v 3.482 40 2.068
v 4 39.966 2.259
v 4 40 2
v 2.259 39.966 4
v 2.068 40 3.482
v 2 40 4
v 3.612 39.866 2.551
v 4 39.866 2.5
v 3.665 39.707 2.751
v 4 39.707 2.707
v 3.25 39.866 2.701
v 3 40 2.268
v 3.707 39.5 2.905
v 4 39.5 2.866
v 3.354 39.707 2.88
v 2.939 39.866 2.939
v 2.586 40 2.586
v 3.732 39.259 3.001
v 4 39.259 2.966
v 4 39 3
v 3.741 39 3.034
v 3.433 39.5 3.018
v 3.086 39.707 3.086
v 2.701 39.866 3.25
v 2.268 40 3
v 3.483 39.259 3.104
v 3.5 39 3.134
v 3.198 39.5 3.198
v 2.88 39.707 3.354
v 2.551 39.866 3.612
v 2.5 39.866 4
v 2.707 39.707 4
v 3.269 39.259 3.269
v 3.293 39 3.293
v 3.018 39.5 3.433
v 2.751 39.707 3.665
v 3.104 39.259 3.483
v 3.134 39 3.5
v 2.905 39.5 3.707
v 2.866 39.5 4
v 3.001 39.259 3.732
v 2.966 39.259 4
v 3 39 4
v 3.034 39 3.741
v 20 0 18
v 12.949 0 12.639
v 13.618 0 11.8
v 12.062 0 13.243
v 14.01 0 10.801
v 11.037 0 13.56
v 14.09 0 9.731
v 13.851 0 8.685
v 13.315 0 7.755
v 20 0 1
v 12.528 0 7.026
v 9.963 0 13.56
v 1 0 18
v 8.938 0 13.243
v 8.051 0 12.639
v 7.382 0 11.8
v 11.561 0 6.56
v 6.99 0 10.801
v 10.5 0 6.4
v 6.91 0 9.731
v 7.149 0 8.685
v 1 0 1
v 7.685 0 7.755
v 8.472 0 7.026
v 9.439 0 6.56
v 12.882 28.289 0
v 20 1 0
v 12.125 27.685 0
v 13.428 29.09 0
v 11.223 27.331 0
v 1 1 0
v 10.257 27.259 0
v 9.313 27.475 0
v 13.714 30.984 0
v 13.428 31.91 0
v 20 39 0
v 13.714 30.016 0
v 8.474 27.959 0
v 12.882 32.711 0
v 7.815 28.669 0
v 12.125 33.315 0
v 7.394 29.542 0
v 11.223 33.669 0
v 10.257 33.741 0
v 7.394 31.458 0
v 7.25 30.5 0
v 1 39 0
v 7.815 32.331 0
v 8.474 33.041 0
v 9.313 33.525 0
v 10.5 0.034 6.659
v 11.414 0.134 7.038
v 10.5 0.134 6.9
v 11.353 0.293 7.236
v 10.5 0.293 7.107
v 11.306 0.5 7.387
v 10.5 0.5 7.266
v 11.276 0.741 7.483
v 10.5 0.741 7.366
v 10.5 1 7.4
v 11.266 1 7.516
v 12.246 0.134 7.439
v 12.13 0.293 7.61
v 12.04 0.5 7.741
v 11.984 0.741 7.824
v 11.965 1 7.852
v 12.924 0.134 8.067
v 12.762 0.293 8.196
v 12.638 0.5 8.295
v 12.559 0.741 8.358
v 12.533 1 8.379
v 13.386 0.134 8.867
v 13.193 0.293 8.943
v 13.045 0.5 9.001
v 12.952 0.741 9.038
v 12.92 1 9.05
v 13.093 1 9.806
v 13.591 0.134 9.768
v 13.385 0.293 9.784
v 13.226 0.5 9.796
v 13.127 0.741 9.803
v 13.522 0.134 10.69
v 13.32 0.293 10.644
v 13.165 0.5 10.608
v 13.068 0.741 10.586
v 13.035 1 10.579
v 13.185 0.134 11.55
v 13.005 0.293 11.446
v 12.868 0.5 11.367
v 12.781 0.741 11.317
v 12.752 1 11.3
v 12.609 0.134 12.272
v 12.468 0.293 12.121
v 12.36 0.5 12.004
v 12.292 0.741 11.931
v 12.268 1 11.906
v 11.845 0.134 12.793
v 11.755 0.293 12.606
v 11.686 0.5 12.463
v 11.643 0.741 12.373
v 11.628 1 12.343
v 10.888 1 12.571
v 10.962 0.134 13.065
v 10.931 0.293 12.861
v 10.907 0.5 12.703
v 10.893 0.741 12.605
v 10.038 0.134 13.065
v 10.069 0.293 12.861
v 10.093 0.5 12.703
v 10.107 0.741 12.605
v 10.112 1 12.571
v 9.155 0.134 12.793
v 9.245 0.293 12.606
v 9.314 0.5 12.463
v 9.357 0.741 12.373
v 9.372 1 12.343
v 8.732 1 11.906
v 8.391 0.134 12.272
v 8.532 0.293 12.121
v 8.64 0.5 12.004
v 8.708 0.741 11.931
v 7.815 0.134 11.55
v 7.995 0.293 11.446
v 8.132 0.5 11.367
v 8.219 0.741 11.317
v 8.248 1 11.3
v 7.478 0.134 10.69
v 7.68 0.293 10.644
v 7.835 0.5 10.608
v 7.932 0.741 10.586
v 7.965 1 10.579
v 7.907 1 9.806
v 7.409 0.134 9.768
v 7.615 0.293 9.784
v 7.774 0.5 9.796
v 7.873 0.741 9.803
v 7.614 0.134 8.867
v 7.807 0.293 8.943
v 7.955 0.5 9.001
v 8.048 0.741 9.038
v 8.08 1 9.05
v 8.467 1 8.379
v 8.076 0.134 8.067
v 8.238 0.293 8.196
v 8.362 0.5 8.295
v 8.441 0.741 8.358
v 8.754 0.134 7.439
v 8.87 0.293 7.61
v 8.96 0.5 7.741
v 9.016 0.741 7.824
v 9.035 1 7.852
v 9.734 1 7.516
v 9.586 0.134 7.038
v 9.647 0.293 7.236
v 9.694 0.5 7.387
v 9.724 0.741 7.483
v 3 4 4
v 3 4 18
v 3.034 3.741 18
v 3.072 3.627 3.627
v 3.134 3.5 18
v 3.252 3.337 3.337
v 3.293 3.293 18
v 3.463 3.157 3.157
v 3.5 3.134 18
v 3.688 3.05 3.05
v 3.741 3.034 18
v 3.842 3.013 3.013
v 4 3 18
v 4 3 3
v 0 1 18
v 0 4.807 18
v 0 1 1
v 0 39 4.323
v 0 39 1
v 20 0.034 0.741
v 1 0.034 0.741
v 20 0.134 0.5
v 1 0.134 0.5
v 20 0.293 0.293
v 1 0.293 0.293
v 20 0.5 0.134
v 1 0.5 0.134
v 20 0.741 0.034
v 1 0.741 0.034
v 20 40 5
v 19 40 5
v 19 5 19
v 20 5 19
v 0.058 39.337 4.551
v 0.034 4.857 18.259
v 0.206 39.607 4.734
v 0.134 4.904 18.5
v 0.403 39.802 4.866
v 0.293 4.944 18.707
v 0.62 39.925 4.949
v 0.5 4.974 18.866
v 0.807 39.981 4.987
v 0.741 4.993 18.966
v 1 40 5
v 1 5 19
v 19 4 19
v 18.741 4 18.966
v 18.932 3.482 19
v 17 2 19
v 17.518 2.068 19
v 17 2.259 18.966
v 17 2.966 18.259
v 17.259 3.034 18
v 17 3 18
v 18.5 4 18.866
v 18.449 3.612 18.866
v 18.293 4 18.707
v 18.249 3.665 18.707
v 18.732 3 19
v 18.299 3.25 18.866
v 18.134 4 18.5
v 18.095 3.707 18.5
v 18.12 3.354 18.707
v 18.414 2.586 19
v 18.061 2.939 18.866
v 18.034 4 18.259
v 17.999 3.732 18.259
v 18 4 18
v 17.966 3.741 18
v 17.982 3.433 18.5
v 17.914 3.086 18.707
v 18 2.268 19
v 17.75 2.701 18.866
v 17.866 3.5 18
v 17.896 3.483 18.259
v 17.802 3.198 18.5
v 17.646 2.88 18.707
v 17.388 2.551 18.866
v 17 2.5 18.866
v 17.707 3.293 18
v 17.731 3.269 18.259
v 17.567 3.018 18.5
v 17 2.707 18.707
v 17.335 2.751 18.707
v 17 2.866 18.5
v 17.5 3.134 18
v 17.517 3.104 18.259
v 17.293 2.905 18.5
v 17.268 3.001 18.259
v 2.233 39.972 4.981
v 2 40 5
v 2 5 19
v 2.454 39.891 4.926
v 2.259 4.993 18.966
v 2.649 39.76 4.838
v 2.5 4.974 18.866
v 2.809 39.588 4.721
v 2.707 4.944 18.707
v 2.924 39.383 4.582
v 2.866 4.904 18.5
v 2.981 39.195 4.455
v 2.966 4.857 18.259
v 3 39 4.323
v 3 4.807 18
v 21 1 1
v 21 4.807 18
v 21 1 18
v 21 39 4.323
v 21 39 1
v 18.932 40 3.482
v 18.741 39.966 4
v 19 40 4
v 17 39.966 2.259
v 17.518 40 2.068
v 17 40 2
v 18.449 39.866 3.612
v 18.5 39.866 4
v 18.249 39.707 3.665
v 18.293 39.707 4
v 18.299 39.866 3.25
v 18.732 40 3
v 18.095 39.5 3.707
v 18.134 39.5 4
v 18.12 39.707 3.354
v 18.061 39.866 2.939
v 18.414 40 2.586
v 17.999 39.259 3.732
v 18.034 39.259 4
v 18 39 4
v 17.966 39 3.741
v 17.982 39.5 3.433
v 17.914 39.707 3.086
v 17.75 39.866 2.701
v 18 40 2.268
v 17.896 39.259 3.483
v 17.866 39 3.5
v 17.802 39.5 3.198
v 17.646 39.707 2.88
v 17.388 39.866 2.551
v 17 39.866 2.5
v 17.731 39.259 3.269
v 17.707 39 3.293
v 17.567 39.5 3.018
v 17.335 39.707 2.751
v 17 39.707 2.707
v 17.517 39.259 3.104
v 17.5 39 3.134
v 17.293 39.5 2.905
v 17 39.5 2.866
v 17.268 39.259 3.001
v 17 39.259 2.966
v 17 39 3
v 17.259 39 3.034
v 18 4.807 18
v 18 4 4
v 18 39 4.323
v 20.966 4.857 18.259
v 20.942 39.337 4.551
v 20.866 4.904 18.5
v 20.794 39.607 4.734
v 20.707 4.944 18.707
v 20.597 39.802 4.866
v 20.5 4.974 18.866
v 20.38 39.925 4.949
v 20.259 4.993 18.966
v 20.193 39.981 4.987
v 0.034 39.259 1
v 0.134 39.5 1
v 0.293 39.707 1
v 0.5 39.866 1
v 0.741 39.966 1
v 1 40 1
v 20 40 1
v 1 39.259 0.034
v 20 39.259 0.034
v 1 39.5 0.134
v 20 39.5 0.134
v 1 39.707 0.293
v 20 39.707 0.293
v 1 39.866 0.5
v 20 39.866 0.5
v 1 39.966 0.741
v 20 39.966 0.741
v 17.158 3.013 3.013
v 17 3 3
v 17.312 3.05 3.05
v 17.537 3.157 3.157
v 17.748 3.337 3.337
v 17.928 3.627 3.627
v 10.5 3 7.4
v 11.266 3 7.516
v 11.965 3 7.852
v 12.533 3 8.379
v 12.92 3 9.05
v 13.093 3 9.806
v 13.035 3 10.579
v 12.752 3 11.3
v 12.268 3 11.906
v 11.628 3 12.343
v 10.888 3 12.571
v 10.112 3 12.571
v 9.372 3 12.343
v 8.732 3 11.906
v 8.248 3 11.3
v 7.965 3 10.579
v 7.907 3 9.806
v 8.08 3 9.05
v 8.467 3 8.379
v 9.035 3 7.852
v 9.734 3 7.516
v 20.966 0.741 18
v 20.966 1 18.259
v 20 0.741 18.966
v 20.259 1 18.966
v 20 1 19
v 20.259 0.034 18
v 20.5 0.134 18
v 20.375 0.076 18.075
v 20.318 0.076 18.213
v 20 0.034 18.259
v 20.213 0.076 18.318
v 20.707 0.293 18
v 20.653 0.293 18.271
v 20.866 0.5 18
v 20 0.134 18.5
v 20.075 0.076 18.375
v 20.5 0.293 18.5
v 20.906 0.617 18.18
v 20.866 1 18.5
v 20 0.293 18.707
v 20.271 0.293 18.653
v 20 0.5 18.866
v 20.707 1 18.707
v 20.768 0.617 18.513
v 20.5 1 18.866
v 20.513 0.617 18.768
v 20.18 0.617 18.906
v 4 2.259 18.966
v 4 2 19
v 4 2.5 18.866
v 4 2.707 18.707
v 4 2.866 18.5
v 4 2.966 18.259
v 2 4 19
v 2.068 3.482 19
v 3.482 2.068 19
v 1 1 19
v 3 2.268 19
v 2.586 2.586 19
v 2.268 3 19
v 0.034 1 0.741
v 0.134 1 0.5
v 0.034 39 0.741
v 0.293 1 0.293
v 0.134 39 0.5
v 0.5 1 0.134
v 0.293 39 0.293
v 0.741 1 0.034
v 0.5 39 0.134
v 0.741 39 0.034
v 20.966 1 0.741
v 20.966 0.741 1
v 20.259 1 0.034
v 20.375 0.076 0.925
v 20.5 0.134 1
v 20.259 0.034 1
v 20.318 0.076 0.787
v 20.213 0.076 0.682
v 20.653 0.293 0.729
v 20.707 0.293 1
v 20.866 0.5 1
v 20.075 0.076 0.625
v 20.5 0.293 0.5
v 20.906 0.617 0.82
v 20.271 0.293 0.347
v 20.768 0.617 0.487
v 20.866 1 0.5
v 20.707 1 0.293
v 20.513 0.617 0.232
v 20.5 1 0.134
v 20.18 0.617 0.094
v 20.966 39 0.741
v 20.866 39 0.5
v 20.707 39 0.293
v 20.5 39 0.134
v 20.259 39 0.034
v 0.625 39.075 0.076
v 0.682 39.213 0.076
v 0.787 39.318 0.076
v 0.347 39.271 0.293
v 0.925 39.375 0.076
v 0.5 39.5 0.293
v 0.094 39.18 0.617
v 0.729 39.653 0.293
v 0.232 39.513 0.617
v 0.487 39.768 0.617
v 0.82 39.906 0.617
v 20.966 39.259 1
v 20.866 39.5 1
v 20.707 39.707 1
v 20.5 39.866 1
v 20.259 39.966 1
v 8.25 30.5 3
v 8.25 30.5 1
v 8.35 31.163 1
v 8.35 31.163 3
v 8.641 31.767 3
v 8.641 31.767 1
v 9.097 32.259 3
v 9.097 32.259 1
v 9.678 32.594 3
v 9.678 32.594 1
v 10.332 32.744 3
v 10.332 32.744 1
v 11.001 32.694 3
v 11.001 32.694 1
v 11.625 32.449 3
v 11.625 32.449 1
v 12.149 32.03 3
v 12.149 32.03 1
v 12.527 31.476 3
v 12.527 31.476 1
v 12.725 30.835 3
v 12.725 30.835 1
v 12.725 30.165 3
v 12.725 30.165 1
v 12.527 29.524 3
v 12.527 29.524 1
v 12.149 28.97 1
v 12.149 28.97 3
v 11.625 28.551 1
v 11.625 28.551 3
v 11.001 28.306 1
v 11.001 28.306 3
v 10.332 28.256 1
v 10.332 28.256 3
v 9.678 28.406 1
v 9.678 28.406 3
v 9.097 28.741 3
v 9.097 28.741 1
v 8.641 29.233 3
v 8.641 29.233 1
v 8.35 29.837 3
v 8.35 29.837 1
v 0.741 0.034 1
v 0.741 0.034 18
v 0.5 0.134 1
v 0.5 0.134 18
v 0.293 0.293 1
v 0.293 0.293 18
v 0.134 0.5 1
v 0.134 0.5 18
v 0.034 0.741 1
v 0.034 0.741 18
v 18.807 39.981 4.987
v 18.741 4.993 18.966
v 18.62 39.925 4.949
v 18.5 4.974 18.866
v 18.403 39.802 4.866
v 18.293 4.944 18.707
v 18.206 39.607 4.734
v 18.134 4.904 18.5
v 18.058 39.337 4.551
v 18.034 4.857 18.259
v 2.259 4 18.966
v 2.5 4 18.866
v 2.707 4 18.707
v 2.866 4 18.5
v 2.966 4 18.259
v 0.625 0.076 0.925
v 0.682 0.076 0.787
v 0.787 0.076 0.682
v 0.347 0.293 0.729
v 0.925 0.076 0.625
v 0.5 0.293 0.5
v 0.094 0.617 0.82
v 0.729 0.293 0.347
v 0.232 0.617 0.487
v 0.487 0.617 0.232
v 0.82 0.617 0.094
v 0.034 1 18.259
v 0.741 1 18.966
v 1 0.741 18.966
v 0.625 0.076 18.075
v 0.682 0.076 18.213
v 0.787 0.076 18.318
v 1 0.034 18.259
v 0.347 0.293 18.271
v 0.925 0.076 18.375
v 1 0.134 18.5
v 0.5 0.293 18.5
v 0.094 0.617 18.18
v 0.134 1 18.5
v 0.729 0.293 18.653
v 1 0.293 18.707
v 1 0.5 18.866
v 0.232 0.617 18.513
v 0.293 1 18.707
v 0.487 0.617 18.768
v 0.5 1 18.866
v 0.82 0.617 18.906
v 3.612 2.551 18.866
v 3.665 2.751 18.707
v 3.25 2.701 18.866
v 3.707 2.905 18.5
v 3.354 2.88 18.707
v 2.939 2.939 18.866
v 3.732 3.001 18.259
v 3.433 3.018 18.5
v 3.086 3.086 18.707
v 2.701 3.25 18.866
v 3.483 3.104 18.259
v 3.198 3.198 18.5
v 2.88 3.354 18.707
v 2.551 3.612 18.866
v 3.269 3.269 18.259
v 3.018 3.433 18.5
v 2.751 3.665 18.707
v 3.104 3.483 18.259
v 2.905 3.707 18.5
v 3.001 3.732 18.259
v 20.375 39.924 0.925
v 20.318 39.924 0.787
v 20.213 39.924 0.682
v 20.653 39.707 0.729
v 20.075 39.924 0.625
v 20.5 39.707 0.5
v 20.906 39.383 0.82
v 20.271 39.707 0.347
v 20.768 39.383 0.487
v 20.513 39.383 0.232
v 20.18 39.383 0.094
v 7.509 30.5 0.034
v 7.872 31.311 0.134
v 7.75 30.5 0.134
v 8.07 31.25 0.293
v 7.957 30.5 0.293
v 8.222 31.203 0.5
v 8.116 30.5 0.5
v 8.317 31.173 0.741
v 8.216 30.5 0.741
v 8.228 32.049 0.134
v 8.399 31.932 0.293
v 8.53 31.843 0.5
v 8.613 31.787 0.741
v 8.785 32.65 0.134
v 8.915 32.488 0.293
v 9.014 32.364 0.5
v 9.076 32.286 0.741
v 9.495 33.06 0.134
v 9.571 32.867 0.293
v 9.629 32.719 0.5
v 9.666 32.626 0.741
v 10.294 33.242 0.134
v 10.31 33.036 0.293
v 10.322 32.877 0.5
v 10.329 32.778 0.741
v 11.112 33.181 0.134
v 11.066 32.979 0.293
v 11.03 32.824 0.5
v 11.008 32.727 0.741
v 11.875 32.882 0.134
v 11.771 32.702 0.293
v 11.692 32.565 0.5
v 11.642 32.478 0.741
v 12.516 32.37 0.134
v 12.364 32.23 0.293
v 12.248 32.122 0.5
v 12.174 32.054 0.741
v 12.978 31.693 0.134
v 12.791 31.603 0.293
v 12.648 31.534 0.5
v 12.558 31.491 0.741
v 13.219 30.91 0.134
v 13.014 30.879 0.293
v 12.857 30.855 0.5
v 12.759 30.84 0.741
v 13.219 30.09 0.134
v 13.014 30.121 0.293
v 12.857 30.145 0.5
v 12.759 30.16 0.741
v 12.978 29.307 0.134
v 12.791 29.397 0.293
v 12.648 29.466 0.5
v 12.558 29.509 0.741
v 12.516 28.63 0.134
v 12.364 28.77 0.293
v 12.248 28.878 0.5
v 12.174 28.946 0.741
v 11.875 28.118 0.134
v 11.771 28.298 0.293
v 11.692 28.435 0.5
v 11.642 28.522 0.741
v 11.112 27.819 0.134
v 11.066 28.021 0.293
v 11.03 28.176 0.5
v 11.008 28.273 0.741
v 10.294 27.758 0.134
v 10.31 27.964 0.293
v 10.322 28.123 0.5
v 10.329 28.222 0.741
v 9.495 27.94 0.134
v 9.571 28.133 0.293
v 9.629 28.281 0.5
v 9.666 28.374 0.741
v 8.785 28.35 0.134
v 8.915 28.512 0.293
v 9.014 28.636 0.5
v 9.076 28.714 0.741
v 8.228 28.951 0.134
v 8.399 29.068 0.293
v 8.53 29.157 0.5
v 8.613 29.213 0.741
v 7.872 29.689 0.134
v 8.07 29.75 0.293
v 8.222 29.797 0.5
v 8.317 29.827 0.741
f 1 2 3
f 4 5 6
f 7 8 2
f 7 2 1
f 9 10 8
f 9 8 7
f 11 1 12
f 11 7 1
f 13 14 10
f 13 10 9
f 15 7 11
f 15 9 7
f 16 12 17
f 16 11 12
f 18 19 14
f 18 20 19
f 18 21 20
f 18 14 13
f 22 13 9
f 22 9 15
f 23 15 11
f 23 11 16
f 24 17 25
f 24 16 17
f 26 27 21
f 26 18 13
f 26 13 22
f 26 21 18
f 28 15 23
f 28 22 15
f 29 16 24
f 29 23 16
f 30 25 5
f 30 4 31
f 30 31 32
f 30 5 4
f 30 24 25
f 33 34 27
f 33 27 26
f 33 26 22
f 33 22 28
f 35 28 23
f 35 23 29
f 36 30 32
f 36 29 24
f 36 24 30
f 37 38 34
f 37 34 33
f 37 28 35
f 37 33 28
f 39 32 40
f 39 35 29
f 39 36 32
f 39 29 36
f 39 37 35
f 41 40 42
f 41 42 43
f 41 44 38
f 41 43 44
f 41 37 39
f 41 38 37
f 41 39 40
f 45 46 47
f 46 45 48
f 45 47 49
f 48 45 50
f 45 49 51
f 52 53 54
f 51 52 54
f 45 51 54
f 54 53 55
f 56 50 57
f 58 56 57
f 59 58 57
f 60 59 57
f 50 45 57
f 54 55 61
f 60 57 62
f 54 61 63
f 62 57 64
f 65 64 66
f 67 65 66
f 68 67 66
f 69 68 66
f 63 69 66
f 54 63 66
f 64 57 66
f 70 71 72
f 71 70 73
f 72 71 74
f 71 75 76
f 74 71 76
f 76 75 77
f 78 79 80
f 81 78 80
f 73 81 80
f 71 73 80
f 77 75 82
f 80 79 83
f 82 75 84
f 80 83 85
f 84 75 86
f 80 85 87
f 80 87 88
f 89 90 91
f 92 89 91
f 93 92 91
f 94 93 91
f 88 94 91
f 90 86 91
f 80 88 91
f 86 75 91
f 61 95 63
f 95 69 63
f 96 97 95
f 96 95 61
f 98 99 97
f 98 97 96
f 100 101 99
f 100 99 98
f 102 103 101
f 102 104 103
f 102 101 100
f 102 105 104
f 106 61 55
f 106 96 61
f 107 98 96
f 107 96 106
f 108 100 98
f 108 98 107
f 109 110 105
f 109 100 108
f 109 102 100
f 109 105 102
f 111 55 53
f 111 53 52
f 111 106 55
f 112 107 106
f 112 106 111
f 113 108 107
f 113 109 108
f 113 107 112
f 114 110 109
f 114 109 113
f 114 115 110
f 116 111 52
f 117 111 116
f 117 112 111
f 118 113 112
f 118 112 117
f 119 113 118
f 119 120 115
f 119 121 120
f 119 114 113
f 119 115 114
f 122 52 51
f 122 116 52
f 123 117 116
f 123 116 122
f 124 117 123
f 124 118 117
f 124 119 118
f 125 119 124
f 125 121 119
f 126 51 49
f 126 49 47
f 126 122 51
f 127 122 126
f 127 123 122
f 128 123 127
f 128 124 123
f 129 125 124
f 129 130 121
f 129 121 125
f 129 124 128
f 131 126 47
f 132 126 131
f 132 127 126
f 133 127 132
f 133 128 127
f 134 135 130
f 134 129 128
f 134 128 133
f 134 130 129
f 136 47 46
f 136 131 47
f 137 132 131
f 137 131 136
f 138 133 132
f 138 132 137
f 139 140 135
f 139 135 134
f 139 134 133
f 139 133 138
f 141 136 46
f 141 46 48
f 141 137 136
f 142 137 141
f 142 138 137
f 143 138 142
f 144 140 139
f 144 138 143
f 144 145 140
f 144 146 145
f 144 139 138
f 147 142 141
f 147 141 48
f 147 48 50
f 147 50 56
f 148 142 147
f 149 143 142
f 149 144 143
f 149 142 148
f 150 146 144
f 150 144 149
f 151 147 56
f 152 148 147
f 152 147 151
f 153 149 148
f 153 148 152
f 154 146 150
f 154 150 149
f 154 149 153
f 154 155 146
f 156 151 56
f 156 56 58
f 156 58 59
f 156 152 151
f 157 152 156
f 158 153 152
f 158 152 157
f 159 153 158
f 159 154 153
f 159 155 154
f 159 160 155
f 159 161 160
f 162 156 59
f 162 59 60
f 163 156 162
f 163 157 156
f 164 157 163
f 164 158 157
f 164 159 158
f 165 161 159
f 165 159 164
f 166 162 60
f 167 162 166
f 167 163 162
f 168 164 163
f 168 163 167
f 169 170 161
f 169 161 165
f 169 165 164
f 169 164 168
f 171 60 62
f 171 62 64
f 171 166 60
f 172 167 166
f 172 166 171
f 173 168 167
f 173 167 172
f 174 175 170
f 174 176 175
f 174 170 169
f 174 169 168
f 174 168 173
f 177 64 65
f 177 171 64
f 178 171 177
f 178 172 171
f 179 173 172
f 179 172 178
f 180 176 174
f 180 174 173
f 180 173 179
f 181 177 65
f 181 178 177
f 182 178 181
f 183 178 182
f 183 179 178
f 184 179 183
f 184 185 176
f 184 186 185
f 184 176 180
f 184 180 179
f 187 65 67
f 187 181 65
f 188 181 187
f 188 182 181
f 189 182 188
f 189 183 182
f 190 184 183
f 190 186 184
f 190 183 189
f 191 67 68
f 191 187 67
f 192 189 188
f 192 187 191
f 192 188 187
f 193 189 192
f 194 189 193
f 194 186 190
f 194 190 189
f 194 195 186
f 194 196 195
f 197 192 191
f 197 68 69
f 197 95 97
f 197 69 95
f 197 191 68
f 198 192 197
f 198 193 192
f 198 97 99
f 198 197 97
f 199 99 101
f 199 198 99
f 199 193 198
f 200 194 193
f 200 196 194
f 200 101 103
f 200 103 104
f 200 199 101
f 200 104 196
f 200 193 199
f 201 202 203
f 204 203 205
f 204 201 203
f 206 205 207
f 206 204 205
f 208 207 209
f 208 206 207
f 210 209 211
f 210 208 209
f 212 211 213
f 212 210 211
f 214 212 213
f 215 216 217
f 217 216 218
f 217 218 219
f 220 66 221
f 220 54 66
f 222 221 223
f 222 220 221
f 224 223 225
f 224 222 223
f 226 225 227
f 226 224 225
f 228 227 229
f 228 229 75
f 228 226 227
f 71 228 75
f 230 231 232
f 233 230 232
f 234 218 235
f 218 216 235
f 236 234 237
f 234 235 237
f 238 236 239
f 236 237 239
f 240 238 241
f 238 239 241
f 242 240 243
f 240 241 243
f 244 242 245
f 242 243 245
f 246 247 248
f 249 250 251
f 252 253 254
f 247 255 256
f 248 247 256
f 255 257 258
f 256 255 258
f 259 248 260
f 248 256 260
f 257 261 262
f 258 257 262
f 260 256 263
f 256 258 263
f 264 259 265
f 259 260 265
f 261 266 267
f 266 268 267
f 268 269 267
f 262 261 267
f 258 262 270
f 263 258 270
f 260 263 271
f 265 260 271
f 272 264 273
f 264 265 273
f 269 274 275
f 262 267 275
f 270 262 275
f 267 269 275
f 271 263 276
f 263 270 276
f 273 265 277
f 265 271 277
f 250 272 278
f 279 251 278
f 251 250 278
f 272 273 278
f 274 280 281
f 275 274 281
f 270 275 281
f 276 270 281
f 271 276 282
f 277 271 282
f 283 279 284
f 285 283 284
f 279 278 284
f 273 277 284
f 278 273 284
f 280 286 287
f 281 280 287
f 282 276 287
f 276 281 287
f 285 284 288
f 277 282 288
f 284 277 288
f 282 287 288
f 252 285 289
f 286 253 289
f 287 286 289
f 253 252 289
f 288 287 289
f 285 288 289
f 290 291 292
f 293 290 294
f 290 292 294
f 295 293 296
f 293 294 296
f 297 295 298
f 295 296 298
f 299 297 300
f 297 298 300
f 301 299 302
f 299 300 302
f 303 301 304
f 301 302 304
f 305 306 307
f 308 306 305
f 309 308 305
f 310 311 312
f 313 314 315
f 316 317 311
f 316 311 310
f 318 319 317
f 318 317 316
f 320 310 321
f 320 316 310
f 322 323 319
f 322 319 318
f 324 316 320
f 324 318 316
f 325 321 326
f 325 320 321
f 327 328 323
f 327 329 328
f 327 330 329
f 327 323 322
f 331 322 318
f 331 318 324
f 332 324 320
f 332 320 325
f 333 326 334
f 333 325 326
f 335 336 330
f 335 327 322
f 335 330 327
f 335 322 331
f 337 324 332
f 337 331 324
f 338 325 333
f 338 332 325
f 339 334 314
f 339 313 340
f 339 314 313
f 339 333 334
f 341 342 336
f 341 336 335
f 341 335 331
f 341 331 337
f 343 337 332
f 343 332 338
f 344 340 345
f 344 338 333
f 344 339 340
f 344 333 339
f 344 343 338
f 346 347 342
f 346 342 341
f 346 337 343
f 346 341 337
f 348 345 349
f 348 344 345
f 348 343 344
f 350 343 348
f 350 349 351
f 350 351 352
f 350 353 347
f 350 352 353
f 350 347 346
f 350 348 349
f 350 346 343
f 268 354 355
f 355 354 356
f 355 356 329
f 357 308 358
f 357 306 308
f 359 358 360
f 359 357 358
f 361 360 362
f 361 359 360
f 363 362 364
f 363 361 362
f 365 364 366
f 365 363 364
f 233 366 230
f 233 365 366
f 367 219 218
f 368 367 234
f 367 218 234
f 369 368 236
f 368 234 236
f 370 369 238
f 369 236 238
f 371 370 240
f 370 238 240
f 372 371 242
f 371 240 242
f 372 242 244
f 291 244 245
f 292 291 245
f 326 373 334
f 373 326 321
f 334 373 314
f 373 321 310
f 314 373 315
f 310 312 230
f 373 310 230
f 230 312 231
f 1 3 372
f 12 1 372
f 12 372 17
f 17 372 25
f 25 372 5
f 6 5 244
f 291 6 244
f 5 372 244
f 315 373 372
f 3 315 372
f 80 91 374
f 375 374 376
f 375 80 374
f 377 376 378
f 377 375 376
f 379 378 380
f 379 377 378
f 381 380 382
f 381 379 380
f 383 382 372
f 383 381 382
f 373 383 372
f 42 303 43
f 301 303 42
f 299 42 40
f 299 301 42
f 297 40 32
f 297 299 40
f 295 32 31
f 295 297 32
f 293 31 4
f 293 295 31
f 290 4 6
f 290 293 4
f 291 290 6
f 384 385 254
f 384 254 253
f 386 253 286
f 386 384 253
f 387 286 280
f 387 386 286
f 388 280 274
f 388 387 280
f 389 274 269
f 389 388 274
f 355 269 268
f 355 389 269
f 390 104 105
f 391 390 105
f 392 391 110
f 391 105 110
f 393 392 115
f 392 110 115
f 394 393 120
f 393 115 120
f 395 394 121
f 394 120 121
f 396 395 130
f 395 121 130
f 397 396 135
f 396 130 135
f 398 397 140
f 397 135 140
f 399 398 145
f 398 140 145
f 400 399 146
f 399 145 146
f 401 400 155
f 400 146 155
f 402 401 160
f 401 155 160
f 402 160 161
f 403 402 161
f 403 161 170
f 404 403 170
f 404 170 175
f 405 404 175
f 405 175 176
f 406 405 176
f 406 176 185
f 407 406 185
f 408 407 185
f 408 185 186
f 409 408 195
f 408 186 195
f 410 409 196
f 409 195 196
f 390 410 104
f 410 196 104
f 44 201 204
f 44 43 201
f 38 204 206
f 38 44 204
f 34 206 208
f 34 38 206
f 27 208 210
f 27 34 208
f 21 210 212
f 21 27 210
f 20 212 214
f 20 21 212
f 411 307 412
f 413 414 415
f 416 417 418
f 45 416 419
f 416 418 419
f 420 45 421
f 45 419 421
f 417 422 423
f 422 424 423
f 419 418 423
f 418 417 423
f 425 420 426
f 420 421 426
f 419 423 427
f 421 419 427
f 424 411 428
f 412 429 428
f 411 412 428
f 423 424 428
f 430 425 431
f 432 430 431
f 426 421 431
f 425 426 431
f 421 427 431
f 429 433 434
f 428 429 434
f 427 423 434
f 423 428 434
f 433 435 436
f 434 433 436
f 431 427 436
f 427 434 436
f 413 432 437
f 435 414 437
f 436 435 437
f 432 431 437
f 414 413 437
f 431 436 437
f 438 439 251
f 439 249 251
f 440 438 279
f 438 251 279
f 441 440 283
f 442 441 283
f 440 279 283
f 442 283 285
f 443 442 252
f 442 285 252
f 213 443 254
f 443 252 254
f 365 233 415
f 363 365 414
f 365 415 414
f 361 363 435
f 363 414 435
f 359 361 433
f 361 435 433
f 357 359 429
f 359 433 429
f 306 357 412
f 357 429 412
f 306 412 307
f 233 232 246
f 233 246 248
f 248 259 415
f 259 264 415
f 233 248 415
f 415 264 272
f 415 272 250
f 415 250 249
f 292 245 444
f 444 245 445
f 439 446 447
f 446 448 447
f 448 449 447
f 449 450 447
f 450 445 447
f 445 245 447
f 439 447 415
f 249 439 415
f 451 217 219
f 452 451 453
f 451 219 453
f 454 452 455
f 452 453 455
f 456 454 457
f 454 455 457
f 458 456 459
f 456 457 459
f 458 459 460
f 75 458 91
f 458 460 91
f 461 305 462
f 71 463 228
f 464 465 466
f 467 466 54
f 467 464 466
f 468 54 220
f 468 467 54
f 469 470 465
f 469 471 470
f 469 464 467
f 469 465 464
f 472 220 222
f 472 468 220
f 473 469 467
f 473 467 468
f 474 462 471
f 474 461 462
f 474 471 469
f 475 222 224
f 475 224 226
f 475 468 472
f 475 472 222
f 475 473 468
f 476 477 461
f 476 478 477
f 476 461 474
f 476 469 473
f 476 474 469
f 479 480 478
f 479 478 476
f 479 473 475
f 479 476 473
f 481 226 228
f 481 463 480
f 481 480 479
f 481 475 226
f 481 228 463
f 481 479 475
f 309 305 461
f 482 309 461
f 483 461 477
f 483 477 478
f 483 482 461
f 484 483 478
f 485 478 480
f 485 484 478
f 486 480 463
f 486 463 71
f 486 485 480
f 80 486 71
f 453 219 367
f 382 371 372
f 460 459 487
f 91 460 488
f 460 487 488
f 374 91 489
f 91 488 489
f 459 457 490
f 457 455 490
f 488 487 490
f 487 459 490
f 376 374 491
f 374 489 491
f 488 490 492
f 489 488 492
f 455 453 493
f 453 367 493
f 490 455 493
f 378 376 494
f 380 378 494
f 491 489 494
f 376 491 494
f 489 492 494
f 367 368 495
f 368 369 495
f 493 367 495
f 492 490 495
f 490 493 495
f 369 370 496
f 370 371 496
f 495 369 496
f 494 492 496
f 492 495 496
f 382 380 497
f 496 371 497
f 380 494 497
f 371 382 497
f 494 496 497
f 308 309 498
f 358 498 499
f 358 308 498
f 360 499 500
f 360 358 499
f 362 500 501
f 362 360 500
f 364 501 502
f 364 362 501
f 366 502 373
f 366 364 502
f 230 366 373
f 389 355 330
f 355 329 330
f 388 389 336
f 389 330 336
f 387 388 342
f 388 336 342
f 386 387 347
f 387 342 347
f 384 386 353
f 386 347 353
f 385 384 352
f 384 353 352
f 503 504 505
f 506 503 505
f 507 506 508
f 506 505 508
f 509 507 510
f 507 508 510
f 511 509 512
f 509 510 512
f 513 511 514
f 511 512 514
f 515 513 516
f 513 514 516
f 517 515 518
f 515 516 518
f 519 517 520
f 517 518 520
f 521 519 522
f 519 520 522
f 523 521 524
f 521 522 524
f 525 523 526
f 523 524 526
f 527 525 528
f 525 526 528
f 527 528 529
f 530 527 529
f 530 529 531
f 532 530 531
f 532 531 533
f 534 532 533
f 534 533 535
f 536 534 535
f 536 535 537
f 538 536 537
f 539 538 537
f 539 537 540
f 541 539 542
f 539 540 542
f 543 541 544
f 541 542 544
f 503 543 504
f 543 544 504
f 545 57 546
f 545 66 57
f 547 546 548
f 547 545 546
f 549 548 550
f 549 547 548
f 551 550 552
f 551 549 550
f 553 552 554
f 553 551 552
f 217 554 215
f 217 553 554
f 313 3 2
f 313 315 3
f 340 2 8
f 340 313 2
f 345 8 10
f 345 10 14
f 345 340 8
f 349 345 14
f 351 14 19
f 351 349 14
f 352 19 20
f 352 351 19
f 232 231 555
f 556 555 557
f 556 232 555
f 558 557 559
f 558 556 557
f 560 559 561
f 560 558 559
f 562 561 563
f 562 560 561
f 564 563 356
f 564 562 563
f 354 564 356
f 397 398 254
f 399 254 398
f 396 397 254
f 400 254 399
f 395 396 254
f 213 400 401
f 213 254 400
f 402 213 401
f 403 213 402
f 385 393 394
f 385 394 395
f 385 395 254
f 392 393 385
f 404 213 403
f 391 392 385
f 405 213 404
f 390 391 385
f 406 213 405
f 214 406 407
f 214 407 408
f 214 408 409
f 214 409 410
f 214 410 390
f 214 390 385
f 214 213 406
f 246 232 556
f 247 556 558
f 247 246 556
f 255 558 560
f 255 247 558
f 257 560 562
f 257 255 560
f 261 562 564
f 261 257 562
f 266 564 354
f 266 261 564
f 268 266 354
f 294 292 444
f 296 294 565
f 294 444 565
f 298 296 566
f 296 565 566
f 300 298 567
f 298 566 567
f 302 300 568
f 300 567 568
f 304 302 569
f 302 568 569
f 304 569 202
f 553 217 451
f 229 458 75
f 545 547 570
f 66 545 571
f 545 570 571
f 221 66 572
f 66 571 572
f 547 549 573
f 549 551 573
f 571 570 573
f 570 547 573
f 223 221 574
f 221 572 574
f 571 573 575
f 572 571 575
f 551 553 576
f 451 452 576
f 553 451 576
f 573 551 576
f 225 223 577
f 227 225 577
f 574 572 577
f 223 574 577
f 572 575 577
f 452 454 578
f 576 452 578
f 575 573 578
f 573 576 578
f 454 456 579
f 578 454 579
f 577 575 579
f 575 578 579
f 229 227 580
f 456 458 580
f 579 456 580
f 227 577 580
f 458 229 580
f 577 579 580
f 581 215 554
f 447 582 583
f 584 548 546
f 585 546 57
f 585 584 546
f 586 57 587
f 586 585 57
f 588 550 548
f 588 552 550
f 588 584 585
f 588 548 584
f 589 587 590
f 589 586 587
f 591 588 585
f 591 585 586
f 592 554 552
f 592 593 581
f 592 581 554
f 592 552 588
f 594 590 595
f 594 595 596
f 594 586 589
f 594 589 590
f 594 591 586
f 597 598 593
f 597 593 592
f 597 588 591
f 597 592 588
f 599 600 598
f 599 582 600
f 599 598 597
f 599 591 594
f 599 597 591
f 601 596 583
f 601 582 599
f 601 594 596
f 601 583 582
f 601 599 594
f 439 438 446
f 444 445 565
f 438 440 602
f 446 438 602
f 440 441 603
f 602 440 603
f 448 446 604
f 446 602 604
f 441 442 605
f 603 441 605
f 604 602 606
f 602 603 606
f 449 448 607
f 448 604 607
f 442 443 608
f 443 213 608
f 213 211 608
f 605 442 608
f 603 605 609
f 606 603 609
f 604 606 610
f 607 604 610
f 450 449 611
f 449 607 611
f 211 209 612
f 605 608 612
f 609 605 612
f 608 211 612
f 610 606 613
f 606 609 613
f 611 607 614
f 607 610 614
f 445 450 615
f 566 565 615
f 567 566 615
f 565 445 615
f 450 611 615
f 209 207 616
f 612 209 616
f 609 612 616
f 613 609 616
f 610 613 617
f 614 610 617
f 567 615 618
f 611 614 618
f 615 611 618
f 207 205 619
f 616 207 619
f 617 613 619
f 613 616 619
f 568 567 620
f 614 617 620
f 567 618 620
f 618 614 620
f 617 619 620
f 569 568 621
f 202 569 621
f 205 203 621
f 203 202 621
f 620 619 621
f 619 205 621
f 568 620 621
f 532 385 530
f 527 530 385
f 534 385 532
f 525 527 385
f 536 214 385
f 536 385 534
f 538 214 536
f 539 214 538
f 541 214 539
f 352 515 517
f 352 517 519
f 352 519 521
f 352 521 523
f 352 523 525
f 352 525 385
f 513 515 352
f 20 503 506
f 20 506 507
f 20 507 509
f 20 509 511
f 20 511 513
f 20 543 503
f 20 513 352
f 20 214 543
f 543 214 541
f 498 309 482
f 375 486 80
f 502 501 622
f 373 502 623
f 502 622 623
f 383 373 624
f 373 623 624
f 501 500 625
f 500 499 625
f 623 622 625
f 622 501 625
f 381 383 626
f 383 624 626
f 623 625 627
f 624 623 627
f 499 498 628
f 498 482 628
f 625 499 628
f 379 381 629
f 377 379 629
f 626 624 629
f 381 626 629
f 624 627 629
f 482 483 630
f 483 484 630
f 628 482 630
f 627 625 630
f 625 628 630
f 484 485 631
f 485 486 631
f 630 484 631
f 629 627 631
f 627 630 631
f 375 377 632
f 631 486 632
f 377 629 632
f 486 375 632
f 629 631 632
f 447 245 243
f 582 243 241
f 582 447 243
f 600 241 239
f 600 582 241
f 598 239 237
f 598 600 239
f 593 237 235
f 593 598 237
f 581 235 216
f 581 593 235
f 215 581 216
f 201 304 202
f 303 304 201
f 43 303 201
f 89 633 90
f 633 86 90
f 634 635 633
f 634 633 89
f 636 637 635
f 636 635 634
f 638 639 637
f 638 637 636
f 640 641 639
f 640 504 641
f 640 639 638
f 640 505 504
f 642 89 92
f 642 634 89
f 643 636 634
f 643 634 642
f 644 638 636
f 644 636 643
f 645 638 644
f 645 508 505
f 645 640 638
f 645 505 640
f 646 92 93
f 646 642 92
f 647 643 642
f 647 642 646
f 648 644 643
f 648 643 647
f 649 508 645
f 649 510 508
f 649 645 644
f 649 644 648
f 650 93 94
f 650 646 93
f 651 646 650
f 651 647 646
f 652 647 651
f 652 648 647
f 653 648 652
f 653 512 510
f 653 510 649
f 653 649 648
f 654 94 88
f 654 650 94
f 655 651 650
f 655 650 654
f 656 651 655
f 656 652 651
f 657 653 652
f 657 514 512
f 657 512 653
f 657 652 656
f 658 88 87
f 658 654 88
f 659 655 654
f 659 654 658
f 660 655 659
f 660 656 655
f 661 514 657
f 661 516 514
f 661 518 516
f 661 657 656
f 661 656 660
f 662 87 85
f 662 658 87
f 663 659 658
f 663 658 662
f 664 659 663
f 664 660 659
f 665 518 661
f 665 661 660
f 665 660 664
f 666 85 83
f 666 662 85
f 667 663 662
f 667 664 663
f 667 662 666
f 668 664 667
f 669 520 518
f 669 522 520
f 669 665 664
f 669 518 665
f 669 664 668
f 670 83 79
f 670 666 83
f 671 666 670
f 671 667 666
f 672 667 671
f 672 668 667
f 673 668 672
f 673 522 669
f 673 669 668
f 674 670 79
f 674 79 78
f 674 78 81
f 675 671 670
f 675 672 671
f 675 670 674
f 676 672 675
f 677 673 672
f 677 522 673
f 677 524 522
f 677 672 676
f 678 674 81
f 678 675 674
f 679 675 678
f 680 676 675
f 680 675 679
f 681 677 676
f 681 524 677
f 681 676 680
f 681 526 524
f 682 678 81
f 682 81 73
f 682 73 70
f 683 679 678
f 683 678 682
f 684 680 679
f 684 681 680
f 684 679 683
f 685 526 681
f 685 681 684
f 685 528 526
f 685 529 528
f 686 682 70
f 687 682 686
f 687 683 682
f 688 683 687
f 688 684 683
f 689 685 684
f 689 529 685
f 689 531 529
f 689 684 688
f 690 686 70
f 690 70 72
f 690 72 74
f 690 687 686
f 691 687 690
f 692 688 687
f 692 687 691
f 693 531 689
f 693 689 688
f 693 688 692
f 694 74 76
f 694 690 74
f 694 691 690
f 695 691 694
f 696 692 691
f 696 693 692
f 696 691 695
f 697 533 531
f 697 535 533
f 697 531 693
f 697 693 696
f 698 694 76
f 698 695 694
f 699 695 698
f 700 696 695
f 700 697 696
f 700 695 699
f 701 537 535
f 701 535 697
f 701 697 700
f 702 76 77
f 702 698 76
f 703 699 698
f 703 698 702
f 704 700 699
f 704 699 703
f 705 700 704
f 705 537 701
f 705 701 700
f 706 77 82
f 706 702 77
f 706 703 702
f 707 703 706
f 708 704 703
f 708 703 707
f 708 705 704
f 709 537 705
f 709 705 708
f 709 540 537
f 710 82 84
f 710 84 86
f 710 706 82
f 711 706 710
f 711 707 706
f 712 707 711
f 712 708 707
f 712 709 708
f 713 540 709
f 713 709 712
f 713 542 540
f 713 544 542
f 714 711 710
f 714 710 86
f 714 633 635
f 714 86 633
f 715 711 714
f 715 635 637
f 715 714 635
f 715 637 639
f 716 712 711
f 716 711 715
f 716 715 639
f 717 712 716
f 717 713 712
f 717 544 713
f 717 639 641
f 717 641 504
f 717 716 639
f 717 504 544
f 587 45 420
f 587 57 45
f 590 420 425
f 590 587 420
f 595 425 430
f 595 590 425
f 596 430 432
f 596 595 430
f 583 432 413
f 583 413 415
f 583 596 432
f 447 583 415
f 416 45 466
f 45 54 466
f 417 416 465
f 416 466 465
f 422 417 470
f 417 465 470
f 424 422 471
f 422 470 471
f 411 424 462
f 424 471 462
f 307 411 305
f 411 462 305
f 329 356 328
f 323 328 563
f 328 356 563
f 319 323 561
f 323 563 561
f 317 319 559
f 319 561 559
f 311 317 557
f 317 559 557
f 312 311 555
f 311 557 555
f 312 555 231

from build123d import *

# Parameters (mm, degrees)
BOSS_EXTRUDE1_DEPTH = 3
BOSS_EXTRUDE2_DEPTH = 15
BOSS_EXTRUDE3_DEPTH = 3
SKETCH5_R           = 2.25
CUT_EXTRUDE1_DEPTH  = 3
SKETCH6_R           = 2.6
CUT_EXTRUDE2_DEPTH  = 3
FILLET1_R           = 1


with BuildPart() as part:
    # Sketch2 → Boss-Extrude1 (new body)
    with BuildSketch(Plane(origin=(0, 0, 0), x_dir=(0, 0, -1), z_dir=(1, 0, 0))):
        Polygon((0, 0), (0, 40), (-5, 40), (-19, 5), (-19, 0), align=None)
    extrude(amount=BOSS_EXTRUDE1_DEPTH)

    # Sketch3 → Boss-Extrude2 (add)
    with BuildSketch(Plane(origin=(3, 0, 0), x_dir=(0, 0, -1), z_dir=(1, 0, 0))):
        Polygon((-19, 0), (-19, 3), (-3, 3), (-3, 40), (0, 40), (0, 0), align=None)
    extrude(amount=BOSS_EXTRUDE2_DEPTH)

    # Sketch4 → Boss-Extrude3 (add)
    with BuildSketch(Plane(origin=(18, 0, 0), x_dir=(0, 0, -1), z_dir=(1, 0, 0))):
        Polygon((-19, 0), (0, 0), (0, 40), (-5, 40), (-19, 5), align=None)
    extrude(amount=BOSS_EXTRUDE3_DEPTH)

    # Sketch5 → Cut-Extrude1 (cut)
    with BuildSketch(Plane(origin=(0, 0, 0), x_dir=(-1, 0, 0), z_dir=(0, 0, -1))):
        with Locations((-10.5, 30.5)):
            Circle(SKETCH5_R)
    extrude(amount=-CUT_EXTRUDE1_DEPTH, mode=Mode.SUBTRACT)

    # Sketch6 → Cut-Extrude2 (cut)
    with BuildSketch(Plane.XZ):
        with Locations(Location((10.5, 10, 0), (0, 0, 270))):
            Circle(SKETCH6_R)
    extrude(amount=-CUT_EXTRUDE2_DEPTH, mode=Mode.SUBTRACT)

    # Fillet1
    fillet1_edges = [part.edges().sort_by_distance(p)[0] for p in [
        (3, 22.5, 12),
        (3, 4, 19),
        (3, 40, 4),
        (3, 21.5, 3),
        (10.5, 40, 3),
        (3, 3, 11),
        (10.5, 3, 19),
        (18, 21.5, 3),
        (18, 3, 11),
        (18, 40, 4),
        (18, 22.5, 12),
        (18, 4, 19),
        (21, 20, 0),
        (21, 40, 2.5),
        (21, 22.5, 12),
        (21, 2.5, 19),
        (21, 0, 9.5),
        (0, 2.5, 19),
        (12.75, 30.5, 0),
        (0, 22.5, 12),
        (10.5, 0, 12.6),
        (0, 40, 2.5),
        (0, 20, 0),
        (0, 0, 9.5),
        (10.5, 0, 19),
        (10.5, 40, 0),
        (10.5, 0, 0),
    ]]
    fillet(fillet1_edges, radius=FILLET1_R)


solid = part.part
